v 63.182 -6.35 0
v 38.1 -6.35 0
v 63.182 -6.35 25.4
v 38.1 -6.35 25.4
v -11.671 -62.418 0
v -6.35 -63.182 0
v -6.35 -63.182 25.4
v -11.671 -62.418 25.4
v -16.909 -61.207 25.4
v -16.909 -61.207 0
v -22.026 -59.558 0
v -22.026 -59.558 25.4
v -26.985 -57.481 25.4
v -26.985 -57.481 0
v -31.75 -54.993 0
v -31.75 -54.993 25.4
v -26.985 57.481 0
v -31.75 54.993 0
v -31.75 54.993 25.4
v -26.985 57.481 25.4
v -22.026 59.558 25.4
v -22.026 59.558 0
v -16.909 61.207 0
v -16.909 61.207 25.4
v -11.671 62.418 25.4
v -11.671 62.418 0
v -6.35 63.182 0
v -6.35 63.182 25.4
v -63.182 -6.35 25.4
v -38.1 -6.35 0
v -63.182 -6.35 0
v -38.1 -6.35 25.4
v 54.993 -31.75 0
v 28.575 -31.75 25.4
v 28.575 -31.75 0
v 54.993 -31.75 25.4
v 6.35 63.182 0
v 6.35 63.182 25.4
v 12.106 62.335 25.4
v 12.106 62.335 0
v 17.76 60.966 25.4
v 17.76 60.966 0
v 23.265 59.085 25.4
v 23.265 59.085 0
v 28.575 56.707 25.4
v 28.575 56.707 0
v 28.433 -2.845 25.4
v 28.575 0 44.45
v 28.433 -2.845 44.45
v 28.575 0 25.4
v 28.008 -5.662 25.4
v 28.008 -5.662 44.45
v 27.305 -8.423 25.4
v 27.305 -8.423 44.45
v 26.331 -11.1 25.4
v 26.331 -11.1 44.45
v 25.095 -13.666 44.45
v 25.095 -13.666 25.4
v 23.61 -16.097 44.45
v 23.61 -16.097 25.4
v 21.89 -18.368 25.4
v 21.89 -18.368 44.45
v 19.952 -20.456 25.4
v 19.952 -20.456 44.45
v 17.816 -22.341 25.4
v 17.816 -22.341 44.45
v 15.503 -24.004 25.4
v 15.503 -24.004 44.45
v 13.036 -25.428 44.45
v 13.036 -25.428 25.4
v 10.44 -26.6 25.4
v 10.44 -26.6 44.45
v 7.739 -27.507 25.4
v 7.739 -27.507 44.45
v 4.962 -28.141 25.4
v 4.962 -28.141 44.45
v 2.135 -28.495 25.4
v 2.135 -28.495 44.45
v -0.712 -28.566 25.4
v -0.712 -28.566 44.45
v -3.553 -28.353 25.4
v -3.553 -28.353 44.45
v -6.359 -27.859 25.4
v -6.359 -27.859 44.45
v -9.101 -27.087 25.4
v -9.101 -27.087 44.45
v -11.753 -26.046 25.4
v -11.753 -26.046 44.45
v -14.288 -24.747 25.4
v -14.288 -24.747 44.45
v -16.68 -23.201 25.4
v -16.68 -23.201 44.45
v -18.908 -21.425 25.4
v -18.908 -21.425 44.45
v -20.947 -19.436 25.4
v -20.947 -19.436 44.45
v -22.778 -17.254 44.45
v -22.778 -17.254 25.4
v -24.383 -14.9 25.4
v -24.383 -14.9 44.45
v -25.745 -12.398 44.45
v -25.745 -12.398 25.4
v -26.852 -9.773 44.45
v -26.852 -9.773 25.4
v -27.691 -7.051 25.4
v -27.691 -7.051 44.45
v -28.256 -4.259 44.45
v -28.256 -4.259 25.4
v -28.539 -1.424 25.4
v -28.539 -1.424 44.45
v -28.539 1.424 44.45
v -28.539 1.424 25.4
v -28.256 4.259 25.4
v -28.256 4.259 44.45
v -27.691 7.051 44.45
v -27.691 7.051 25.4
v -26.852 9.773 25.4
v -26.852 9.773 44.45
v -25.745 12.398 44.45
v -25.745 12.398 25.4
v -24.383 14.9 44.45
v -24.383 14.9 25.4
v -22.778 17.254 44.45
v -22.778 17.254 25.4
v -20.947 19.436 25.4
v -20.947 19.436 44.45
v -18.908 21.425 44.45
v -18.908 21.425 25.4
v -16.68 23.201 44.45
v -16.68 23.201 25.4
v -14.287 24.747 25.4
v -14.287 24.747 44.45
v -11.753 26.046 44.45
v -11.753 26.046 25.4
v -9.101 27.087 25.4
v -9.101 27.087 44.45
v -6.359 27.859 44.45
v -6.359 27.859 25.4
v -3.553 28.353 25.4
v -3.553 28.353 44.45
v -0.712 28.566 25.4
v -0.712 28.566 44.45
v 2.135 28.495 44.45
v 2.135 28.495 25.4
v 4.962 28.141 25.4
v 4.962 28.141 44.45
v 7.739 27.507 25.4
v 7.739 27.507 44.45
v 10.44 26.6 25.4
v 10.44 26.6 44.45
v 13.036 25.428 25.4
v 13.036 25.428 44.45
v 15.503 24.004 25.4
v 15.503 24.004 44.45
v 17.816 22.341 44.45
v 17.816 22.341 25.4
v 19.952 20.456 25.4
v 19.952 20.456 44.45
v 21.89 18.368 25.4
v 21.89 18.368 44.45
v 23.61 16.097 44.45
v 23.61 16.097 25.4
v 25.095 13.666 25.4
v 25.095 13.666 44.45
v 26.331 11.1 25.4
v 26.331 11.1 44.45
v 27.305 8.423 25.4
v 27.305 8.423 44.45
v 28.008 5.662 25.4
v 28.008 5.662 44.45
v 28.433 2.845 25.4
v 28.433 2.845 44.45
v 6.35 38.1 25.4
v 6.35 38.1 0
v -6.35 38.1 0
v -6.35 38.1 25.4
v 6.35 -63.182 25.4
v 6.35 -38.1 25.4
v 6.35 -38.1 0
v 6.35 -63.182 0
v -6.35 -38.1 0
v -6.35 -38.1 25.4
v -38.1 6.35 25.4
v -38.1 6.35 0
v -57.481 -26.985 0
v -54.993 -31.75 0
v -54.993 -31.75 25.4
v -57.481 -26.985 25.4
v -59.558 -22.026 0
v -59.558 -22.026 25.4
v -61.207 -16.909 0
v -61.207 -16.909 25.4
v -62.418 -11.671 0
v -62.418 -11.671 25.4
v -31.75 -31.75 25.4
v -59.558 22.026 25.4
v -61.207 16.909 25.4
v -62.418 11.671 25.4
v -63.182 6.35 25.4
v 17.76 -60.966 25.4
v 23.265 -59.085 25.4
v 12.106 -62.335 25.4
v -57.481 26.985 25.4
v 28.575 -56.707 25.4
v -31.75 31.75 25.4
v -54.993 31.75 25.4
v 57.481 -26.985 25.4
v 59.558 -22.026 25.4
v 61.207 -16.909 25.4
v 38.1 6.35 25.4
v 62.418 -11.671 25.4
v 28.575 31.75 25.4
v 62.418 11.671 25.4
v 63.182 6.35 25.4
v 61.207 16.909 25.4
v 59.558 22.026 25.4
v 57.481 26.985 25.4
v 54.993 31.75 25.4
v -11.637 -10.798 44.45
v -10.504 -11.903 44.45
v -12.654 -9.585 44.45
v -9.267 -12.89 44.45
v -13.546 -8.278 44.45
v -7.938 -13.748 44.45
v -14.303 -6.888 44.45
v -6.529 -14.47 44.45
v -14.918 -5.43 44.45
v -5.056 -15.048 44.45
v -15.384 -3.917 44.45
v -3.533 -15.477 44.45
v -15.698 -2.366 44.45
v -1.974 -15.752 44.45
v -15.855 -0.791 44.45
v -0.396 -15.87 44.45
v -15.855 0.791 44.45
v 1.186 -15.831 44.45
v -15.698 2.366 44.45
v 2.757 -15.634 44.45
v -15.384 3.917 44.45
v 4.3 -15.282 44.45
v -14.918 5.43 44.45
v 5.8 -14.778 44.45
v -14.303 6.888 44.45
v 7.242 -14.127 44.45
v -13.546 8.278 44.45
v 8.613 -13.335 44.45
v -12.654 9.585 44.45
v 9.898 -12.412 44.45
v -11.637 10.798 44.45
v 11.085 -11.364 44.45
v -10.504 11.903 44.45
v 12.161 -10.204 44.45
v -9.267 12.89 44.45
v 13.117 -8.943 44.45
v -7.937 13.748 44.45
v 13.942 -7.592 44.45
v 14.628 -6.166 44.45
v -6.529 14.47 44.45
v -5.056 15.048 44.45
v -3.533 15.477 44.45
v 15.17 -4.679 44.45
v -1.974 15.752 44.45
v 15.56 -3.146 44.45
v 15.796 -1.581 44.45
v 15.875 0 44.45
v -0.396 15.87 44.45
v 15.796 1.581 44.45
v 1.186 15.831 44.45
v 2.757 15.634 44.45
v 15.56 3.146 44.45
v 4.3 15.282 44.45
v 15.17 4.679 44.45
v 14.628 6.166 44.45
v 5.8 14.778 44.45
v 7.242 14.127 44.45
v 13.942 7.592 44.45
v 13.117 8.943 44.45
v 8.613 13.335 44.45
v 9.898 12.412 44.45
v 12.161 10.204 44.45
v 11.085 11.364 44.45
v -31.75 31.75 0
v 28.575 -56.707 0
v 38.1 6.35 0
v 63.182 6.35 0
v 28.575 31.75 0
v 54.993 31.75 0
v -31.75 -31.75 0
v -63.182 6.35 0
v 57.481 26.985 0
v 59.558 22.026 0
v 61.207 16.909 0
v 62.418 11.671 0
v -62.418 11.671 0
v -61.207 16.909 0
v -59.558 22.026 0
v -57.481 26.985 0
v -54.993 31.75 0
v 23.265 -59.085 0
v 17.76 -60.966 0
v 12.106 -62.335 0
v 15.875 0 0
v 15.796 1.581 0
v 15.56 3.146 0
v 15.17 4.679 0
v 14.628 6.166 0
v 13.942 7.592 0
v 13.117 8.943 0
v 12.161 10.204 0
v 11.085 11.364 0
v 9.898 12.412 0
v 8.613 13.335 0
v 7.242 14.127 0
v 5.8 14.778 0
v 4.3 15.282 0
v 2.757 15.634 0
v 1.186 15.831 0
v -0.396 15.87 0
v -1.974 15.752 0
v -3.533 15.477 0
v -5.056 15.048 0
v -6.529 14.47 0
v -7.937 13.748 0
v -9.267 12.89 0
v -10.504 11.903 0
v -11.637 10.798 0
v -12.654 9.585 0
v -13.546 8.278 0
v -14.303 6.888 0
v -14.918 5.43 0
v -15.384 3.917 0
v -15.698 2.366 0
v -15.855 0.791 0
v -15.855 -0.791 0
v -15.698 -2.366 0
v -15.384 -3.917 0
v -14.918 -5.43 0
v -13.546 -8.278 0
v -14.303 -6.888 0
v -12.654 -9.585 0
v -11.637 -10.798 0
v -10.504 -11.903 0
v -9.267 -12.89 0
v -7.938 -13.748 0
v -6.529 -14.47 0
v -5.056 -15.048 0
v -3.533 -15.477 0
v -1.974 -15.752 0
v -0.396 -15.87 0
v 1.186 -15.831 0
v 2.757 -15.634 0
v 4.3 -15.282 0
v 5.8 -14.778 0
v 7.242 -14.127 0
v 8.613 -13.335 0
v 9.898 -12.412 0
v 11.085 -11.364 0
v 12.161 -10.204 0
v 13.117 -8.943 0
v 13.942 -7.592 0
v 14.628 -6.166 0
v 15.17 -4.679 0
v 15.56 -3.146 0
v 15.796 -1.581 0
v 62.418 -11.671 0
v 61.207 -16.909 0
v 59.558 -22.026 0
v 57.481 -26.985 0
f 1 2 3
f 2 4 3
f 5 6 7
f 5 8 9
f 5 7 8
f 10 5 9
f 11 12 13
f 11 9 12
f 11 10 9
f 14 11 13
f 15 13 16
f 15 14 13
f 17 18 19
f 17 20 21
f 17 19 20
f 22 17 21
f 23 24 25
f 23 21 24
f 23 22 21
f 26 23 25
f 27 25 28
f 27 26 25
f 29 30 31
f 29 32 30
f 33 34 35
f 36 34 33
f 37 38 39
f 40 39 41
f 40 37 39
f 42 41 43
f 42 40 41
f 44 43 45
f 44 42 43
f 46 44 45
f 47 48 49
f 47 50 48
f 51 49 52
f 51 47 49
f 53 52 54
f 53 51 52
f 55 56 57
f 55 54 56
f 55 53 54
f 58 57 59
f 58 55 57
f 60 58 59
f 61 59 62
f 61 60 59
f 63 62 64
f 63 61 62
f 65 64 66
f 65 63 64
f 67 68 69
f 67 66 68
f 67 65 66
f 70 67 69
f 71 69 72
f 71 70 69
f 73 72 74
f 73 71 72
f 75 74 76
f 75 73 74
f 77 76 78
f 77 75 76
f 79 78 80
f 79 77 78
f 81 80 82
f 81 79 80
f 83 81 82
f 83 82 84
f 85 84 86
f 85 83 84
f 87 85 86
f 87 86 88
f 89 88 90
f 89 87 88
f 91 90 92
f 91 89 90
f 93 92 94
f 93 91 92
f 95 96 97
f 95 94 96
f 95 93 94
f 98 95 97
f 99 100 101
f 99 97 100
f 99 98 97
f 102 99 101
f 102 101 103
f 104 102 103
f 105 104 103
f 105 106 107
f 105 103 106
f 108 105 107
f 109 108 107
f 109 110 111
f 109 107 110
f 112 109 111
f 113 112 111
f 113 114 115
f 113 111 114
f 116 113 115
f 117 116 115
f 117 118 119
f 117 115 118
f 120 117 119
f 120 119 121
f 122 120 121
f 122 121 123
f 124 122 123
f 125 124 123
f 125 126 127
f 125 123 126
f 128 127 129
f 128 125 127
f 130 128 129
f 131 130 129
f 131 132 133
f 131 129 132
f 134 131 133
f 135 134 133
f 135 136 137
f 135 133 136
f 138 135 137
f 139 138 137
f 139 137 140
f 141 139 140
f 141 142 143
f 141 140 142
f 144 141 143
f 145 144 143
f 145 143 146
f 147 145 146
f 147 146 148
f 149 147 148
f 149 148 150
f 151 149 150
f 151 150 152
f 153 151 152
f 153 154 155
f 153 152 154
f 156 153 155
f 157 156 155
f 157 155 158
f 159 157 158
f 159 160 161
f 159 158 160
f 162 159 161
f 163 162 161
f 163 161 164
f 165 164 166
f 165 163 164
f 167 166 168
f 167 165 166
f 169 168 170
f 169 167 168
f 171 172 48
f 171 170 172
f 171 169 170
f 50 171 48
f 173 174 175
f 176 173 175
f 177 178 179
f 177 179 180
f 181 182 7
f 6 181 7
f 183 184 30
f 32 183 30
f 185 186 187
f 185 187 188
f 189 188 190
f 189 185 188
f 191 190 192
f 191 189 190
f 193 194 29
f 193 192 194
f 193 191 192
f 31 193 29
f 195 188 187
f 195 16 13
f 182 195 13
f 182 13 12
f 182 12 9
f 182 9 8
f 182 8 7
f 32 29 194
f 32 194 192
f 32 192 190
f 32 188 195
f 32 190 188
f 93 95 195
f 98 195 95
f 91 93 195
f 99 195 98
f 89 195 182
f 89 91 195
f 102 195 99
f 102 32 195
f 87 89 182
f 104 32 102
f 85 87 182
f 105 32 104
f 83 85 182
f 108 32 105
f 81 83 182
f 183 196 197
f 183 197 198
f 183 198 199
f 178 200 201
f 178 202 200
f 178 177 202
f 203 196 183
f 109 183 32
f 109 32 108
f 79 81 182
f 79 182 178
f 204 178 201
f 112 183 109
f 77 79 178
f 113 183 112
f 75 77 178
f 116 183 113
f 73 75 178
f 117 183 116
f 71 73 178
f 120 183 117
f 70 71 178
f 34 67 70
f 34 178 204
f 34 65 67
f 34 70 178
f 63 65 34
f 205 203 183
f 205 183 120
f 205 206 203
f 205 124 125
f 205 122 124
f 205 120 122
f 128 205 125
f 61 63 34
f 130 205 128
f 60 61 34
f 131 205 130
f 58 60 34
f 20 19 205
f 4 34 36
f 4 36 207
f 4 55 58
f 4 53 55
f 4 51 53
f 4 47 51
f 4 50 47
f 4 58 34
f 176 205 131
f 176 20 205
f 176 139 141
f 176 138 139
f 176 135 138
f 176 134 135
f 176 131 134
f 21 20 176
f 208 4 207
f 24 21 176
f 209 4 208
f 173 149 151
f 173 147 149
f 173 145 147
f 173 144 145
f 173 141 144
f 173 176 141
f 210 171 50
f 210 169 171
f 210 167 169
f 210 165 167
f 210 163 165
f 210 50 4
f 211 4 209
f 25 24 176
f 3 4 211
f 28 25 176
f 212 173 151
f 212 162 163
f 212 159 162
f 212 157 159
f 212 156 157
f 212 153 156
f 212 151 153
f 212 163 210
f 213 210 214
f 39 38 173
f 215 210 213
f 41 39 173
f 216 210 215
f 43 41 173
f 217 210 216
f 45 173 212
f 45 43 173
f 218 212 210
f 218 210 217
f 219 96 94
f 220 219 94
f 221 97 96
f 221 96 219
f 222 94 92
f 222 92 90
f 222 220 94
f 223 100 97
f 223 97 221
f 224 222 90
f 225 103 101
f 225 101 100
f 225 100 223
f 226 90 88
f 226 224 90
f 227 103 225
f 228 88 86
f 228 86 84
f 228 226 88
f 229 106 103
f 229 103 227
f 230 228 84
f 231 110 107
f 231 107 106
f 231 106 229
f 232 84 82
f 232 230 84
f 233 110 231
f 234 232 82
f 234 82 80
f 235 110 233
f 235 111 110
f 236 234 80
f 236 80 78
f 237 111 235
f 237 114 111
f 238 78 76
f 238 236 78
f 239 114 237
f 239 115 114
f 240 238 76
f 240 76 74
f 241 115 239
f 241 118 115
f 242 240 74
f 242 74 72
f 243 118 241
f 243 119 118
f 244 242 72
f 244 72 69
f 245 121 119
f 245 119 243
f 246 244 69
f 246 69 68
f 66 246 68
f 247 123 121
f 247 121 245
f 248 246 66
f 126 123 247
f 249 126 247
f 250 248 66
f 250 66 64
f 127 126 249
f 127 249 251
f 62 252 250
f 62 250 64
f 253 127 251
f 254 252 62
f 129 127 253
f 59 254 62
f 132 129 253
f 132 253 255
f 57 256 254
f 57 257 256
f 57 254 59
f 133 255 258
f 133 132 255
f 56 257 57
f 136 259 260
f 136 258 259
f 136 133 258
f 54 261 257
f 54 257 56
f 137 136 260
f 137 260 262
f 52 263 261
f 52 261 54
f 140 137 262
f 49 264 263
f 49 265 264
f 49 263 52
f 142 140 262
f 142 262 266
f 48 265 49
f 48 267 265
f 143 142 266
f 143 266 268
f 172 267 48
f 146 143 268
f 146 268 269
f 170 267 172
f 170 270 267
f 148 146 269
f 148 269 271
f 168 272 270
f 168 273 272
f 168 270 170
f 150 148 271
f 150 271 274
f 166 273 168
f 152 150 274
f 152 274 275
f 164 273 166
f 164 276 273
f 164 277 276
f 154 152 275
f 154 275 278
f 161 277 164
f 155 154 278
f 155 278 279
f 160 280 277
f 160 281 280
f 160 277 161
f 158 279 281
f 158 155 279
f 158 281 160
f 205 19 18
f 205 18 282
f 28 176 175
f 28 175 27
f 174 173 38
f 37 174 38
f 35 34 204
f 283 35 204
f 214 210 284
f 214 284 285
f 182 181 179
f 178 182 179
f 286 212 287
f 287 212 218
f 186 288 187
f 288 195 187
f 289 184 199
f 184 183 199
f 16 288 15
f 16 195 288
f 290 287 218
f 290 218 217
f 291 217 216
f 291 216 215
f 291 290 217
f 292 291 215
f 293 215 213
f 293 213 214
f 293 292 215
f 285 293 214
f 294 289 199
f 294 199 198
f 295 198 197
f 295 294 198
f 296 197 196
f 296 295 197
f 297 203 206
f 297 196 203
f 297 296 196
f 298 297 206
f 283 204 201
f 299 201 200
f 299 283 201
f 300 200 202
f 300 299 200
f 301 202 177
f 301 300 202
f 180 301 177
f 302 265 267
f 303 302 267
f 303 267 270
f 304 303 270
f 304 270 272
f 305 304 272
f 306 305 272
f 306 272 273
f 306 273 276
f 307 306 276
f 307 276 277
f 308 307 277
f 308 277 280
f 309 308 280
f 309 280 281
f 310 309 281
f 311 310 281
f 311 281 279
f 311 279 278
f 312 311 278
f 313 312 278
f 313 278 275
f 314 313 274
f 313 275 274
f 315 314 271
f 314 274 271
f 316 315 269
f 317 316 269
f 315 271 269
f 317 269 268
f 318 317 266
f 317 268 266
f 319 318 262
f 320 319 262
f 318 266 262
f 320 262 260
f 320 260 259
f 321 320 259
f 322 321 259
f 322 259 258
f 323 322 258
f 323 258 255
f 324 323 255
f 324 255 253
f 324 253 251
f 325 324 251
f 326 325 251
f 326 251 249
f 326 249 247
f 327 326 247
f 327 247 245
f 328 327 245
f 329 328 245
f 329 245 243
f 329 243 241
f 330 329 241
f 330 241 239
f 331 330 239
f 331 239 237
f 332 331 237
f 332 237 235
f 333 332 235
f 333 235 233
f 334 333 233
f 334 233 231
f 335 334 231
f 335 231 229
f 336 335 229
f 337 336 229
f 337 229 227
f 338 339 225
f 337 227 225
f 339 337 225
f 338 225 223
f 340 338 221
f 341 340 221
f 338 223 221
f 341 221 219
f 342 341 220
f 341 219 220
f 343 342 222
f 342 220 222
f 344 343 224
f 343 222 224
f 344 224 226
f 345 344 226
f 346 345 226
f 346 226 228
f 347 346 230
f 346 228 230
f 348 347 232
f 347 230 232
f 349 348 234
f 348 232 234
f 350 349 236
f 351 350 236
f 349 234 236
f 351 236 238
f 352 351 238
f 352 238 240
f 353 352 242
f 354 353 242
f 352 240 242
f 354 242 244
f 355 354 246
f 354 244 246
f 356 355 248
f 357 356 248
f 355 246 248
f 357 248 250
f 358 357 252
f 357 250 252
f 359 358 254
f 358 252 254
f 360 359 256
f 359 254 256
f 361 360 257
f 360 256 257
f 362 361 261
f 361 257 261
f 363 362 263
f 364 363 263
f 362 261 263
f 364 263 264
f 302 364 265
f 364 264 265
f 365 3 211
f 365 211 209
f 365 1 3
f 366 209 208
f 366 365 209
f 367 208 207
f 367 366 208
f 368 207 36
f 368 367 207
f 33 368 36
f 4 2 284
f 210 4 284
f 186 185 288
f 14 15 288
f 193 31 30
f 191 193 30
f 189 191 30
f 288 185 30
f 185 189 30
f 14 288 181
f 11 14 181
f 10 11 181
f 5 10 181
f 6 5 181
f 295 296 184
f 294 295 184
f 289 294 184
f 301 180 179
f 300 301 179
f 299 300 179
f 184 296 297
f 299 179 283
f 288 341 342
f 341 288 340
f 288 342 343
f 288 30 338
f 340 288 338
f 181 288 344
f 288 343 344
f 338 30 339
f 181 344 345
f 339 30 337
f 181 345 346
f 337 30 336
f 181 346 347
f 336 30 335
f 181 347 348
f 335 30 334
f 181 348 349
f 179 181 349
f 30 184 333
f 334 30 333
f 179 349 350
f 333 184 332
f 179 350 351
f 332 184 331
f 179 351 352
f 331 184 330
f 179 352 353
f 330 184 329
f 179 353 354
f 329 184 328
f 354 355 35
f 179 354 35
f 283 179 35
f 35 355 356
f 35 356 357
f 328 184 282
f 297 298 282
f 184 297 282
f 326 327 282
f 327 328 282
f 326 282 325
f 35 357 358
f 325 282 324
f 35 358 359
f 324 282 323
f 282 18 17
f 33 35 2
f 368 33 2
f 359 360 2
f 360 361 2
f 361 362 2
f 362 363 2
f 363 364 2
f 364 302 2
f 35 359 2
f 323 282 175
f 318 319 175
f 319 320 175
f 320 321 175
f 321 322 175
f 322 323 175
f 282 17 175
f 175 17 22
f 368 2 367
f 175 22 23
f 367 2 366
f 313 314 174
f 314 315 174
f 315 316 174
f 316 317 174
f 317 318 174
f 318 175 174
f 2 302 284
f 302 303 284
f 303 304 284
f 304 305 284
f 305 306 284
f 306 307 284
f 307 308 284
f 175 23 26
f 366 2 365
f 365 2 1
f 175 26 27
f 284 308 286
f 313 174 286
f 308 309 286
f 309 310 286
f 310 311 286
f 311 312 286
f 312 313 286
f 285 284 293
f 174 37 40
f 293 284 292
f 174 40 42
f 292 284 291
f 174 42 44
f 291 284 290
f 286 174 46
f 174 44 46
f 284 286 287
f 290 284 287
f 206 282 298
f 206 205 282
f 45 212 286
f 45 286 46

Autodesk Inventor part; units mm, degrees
ref_plane "YZ Plane" through (0, 0, 0) normal (1, 0, 0) x (0, 1, 0)
ref_plane "XZ Plane" through (0, 0, 0) normal (0, 1, 0) x (-1, 0, 0)
ref_plane "XY Plane" through (0, 0, 0) normal (0, 0, 1) x (1, 0, 0)
sketch "Sketch1" plane through (0, 0, 0) normal (0, 0, 1) x (1, 0, 0)
  circle A0 centre (0, 0) radius 63.5
  dimension "d0" = 127
extrude "Extrusion1" add sketch "Sketch1" along normal blind 25.4
sketch "Sketch2" plane through (0, 0, 25.4) normal (0, 0, 1) x (1, 0, 0)
  circle A0 centre (0, 0) radius 28.575
  dimension "d3" = 57.15
extrude "Extrusion2" add sketch "Sketch2" along normal blind 19.05
sketch "Sketch3" plane through (0, 0, 44.45) normal (0, 0, 1) x (1, 0, 0)
  circle A0 centre (0, 0) radius 15.875
  dimension "d6" = 31.75
extrude "Extrusion3" cut sketch "Sketch3" against normal through all
sketch "Sketch4" plane through (0, 0, 25.4) normal (0, 0, 1) x (1, 0, 0)
  line L0 (0, 0) -> (0, 38.1)
  line L1 (0, 38.1) -> (0, -38.1)
  line L2 (0, -38.1) -> (6.35, -38.1)
  line L3 (6.35, -38.1) -> (6.35, -63.1817)
  circle A0 centre (0, 0) radius 63.5 projected
  line L4 (0, -38.1) -> (-6.35, -38.1)
  line L5 (-6.35, -38.1) -> (-6.35, -80.9216)
  line L6 (-6.35, -80.9216) -> (6.35, -63.1817)
  line L7 (0, 38.1) -> (6.35, 38.1)
  line L8 (6.35, 38.1) -> (6.35, 68.5855)
  line L9 (0, 38.1) -> (-6.35, 38.1)
  line L10 (-6.35, 38.1) -> (-6.35, 68.5855)
  line L11 (-6.35, 68.5855) -> (6.35, 68.5855)
  dimension "d9" = 38.1
  dimension "d10" = 76.2
  dimension "d11" = 6.35
  dimension "d12" = 6.35
  dimension "d13" = 6.35
  dimension "d14" = 6.35
extrude "Extrusion4" cut sketch "Sketch4" against normal through all contours L9 L10 A0 L8 L7 | L2 L3 A0 L5 L4 | A0 L10 L11 L8 | L6 L5 A0
sketch "Sketch5" plane through (0, 0, 25.4) normal (0, 0, 1) x (1, 0, 0)
  line L0 (0, 0) -> (38.1, 0)
  line L1 (38.1, 0) -> (-38.1, 0)
  line L2 (-38.1, 0) -> (-38.1, 6.35)
  line L3 (-38.1, 6.35) -> (-99.0804, 6.35)
  line L4 (-38.1, 0) -> (-38.1, -6.35)
  line L5 (-38.1, -6.35) -> (-95.4724, -6.35)
  line L6 (-95.4724, -6.35) -> (-99.0804, 6.35)
  line L7 (38.1, 0) -> (38.1, -6.35)
  line L8 (38.1, -6.35) -> (92.4195, -6.35)
  line L9 (38.1, 0) -> (38.1, 6.35)
  line L10 (38.1, 6.35) -> (95.1949, 6.35)
  line L11 (95.1949, 6.35) -> (92.4195, -6.35)
  dimension "d17" = 38.1
  dimension "d18" = 76.2
  dimension "d19" = 6.35
  dimension "d20" = 6.35
  dimension "d21" = 6.35
  dimension "d22" = 6.35
extrude "Extrusion5" cut sketch "Sketch5" against normal through all
sketch "Sketch6" plane through (0, 0, 25.4) normal (0, 0, 1) x (1, 0, 0)
  point P0 (0, 0)
sketch "Sketch7" plane through (0, 0, 25.4) normal (0, 0, 1) x (1, 0, 0)
  line L0 (0, 0) -> (31.75, 0)
  line L1 (0, 0) -> (0, 31.75)
  line L2 (0, 31.75) -> (124.8927, 31.75)
  line L3 (0, 0) -> (0, -31.75)
  line L4 (0, 0) -> (-31.75, 0)
  line L5 (-31.75, 0) -> (-145.867, 0)
  line L6 (0, 31.75) -> (-126.7995, 31.75)
  line L7 (0, -31.75) -> (-134.9032, -31.75)
  line L8 (0, -31.75) -> (128.2295, -31.75)
  line L9 (-31.75, -31.75) -> (-31.75, -121.3175)
  line L10 (-31.75, -121.3175) -> (-134.9032, -31.75)
  line L11 (28.575, -31.75) -> (28.575, -121.3175)
  line L12 (28.575, -121.3175) -> (128.2295, -31.75)
  line L13 (28.575, 31.75) -> (28.575, 107.95)
  line L14 (28.575, 107.95) -> (124.8927, 31.75)
  line L15 (-126.7995, 31.75) -> (-31.75, 99.6281)
  line L16 (-31.75, 99.6281) -> (-31.75, 31.75)
  dimension "d25" = 31.75
  dimension "d26" = 31.75
  dimension "d27" = 31.75
  dimension "d28" = 31.75
  dimension "d29" = 76.2
extrude "Extrusion6" cut sketch "Sketch7" against normal through all
properties part number "3-3" material "Iron, Malleable"
